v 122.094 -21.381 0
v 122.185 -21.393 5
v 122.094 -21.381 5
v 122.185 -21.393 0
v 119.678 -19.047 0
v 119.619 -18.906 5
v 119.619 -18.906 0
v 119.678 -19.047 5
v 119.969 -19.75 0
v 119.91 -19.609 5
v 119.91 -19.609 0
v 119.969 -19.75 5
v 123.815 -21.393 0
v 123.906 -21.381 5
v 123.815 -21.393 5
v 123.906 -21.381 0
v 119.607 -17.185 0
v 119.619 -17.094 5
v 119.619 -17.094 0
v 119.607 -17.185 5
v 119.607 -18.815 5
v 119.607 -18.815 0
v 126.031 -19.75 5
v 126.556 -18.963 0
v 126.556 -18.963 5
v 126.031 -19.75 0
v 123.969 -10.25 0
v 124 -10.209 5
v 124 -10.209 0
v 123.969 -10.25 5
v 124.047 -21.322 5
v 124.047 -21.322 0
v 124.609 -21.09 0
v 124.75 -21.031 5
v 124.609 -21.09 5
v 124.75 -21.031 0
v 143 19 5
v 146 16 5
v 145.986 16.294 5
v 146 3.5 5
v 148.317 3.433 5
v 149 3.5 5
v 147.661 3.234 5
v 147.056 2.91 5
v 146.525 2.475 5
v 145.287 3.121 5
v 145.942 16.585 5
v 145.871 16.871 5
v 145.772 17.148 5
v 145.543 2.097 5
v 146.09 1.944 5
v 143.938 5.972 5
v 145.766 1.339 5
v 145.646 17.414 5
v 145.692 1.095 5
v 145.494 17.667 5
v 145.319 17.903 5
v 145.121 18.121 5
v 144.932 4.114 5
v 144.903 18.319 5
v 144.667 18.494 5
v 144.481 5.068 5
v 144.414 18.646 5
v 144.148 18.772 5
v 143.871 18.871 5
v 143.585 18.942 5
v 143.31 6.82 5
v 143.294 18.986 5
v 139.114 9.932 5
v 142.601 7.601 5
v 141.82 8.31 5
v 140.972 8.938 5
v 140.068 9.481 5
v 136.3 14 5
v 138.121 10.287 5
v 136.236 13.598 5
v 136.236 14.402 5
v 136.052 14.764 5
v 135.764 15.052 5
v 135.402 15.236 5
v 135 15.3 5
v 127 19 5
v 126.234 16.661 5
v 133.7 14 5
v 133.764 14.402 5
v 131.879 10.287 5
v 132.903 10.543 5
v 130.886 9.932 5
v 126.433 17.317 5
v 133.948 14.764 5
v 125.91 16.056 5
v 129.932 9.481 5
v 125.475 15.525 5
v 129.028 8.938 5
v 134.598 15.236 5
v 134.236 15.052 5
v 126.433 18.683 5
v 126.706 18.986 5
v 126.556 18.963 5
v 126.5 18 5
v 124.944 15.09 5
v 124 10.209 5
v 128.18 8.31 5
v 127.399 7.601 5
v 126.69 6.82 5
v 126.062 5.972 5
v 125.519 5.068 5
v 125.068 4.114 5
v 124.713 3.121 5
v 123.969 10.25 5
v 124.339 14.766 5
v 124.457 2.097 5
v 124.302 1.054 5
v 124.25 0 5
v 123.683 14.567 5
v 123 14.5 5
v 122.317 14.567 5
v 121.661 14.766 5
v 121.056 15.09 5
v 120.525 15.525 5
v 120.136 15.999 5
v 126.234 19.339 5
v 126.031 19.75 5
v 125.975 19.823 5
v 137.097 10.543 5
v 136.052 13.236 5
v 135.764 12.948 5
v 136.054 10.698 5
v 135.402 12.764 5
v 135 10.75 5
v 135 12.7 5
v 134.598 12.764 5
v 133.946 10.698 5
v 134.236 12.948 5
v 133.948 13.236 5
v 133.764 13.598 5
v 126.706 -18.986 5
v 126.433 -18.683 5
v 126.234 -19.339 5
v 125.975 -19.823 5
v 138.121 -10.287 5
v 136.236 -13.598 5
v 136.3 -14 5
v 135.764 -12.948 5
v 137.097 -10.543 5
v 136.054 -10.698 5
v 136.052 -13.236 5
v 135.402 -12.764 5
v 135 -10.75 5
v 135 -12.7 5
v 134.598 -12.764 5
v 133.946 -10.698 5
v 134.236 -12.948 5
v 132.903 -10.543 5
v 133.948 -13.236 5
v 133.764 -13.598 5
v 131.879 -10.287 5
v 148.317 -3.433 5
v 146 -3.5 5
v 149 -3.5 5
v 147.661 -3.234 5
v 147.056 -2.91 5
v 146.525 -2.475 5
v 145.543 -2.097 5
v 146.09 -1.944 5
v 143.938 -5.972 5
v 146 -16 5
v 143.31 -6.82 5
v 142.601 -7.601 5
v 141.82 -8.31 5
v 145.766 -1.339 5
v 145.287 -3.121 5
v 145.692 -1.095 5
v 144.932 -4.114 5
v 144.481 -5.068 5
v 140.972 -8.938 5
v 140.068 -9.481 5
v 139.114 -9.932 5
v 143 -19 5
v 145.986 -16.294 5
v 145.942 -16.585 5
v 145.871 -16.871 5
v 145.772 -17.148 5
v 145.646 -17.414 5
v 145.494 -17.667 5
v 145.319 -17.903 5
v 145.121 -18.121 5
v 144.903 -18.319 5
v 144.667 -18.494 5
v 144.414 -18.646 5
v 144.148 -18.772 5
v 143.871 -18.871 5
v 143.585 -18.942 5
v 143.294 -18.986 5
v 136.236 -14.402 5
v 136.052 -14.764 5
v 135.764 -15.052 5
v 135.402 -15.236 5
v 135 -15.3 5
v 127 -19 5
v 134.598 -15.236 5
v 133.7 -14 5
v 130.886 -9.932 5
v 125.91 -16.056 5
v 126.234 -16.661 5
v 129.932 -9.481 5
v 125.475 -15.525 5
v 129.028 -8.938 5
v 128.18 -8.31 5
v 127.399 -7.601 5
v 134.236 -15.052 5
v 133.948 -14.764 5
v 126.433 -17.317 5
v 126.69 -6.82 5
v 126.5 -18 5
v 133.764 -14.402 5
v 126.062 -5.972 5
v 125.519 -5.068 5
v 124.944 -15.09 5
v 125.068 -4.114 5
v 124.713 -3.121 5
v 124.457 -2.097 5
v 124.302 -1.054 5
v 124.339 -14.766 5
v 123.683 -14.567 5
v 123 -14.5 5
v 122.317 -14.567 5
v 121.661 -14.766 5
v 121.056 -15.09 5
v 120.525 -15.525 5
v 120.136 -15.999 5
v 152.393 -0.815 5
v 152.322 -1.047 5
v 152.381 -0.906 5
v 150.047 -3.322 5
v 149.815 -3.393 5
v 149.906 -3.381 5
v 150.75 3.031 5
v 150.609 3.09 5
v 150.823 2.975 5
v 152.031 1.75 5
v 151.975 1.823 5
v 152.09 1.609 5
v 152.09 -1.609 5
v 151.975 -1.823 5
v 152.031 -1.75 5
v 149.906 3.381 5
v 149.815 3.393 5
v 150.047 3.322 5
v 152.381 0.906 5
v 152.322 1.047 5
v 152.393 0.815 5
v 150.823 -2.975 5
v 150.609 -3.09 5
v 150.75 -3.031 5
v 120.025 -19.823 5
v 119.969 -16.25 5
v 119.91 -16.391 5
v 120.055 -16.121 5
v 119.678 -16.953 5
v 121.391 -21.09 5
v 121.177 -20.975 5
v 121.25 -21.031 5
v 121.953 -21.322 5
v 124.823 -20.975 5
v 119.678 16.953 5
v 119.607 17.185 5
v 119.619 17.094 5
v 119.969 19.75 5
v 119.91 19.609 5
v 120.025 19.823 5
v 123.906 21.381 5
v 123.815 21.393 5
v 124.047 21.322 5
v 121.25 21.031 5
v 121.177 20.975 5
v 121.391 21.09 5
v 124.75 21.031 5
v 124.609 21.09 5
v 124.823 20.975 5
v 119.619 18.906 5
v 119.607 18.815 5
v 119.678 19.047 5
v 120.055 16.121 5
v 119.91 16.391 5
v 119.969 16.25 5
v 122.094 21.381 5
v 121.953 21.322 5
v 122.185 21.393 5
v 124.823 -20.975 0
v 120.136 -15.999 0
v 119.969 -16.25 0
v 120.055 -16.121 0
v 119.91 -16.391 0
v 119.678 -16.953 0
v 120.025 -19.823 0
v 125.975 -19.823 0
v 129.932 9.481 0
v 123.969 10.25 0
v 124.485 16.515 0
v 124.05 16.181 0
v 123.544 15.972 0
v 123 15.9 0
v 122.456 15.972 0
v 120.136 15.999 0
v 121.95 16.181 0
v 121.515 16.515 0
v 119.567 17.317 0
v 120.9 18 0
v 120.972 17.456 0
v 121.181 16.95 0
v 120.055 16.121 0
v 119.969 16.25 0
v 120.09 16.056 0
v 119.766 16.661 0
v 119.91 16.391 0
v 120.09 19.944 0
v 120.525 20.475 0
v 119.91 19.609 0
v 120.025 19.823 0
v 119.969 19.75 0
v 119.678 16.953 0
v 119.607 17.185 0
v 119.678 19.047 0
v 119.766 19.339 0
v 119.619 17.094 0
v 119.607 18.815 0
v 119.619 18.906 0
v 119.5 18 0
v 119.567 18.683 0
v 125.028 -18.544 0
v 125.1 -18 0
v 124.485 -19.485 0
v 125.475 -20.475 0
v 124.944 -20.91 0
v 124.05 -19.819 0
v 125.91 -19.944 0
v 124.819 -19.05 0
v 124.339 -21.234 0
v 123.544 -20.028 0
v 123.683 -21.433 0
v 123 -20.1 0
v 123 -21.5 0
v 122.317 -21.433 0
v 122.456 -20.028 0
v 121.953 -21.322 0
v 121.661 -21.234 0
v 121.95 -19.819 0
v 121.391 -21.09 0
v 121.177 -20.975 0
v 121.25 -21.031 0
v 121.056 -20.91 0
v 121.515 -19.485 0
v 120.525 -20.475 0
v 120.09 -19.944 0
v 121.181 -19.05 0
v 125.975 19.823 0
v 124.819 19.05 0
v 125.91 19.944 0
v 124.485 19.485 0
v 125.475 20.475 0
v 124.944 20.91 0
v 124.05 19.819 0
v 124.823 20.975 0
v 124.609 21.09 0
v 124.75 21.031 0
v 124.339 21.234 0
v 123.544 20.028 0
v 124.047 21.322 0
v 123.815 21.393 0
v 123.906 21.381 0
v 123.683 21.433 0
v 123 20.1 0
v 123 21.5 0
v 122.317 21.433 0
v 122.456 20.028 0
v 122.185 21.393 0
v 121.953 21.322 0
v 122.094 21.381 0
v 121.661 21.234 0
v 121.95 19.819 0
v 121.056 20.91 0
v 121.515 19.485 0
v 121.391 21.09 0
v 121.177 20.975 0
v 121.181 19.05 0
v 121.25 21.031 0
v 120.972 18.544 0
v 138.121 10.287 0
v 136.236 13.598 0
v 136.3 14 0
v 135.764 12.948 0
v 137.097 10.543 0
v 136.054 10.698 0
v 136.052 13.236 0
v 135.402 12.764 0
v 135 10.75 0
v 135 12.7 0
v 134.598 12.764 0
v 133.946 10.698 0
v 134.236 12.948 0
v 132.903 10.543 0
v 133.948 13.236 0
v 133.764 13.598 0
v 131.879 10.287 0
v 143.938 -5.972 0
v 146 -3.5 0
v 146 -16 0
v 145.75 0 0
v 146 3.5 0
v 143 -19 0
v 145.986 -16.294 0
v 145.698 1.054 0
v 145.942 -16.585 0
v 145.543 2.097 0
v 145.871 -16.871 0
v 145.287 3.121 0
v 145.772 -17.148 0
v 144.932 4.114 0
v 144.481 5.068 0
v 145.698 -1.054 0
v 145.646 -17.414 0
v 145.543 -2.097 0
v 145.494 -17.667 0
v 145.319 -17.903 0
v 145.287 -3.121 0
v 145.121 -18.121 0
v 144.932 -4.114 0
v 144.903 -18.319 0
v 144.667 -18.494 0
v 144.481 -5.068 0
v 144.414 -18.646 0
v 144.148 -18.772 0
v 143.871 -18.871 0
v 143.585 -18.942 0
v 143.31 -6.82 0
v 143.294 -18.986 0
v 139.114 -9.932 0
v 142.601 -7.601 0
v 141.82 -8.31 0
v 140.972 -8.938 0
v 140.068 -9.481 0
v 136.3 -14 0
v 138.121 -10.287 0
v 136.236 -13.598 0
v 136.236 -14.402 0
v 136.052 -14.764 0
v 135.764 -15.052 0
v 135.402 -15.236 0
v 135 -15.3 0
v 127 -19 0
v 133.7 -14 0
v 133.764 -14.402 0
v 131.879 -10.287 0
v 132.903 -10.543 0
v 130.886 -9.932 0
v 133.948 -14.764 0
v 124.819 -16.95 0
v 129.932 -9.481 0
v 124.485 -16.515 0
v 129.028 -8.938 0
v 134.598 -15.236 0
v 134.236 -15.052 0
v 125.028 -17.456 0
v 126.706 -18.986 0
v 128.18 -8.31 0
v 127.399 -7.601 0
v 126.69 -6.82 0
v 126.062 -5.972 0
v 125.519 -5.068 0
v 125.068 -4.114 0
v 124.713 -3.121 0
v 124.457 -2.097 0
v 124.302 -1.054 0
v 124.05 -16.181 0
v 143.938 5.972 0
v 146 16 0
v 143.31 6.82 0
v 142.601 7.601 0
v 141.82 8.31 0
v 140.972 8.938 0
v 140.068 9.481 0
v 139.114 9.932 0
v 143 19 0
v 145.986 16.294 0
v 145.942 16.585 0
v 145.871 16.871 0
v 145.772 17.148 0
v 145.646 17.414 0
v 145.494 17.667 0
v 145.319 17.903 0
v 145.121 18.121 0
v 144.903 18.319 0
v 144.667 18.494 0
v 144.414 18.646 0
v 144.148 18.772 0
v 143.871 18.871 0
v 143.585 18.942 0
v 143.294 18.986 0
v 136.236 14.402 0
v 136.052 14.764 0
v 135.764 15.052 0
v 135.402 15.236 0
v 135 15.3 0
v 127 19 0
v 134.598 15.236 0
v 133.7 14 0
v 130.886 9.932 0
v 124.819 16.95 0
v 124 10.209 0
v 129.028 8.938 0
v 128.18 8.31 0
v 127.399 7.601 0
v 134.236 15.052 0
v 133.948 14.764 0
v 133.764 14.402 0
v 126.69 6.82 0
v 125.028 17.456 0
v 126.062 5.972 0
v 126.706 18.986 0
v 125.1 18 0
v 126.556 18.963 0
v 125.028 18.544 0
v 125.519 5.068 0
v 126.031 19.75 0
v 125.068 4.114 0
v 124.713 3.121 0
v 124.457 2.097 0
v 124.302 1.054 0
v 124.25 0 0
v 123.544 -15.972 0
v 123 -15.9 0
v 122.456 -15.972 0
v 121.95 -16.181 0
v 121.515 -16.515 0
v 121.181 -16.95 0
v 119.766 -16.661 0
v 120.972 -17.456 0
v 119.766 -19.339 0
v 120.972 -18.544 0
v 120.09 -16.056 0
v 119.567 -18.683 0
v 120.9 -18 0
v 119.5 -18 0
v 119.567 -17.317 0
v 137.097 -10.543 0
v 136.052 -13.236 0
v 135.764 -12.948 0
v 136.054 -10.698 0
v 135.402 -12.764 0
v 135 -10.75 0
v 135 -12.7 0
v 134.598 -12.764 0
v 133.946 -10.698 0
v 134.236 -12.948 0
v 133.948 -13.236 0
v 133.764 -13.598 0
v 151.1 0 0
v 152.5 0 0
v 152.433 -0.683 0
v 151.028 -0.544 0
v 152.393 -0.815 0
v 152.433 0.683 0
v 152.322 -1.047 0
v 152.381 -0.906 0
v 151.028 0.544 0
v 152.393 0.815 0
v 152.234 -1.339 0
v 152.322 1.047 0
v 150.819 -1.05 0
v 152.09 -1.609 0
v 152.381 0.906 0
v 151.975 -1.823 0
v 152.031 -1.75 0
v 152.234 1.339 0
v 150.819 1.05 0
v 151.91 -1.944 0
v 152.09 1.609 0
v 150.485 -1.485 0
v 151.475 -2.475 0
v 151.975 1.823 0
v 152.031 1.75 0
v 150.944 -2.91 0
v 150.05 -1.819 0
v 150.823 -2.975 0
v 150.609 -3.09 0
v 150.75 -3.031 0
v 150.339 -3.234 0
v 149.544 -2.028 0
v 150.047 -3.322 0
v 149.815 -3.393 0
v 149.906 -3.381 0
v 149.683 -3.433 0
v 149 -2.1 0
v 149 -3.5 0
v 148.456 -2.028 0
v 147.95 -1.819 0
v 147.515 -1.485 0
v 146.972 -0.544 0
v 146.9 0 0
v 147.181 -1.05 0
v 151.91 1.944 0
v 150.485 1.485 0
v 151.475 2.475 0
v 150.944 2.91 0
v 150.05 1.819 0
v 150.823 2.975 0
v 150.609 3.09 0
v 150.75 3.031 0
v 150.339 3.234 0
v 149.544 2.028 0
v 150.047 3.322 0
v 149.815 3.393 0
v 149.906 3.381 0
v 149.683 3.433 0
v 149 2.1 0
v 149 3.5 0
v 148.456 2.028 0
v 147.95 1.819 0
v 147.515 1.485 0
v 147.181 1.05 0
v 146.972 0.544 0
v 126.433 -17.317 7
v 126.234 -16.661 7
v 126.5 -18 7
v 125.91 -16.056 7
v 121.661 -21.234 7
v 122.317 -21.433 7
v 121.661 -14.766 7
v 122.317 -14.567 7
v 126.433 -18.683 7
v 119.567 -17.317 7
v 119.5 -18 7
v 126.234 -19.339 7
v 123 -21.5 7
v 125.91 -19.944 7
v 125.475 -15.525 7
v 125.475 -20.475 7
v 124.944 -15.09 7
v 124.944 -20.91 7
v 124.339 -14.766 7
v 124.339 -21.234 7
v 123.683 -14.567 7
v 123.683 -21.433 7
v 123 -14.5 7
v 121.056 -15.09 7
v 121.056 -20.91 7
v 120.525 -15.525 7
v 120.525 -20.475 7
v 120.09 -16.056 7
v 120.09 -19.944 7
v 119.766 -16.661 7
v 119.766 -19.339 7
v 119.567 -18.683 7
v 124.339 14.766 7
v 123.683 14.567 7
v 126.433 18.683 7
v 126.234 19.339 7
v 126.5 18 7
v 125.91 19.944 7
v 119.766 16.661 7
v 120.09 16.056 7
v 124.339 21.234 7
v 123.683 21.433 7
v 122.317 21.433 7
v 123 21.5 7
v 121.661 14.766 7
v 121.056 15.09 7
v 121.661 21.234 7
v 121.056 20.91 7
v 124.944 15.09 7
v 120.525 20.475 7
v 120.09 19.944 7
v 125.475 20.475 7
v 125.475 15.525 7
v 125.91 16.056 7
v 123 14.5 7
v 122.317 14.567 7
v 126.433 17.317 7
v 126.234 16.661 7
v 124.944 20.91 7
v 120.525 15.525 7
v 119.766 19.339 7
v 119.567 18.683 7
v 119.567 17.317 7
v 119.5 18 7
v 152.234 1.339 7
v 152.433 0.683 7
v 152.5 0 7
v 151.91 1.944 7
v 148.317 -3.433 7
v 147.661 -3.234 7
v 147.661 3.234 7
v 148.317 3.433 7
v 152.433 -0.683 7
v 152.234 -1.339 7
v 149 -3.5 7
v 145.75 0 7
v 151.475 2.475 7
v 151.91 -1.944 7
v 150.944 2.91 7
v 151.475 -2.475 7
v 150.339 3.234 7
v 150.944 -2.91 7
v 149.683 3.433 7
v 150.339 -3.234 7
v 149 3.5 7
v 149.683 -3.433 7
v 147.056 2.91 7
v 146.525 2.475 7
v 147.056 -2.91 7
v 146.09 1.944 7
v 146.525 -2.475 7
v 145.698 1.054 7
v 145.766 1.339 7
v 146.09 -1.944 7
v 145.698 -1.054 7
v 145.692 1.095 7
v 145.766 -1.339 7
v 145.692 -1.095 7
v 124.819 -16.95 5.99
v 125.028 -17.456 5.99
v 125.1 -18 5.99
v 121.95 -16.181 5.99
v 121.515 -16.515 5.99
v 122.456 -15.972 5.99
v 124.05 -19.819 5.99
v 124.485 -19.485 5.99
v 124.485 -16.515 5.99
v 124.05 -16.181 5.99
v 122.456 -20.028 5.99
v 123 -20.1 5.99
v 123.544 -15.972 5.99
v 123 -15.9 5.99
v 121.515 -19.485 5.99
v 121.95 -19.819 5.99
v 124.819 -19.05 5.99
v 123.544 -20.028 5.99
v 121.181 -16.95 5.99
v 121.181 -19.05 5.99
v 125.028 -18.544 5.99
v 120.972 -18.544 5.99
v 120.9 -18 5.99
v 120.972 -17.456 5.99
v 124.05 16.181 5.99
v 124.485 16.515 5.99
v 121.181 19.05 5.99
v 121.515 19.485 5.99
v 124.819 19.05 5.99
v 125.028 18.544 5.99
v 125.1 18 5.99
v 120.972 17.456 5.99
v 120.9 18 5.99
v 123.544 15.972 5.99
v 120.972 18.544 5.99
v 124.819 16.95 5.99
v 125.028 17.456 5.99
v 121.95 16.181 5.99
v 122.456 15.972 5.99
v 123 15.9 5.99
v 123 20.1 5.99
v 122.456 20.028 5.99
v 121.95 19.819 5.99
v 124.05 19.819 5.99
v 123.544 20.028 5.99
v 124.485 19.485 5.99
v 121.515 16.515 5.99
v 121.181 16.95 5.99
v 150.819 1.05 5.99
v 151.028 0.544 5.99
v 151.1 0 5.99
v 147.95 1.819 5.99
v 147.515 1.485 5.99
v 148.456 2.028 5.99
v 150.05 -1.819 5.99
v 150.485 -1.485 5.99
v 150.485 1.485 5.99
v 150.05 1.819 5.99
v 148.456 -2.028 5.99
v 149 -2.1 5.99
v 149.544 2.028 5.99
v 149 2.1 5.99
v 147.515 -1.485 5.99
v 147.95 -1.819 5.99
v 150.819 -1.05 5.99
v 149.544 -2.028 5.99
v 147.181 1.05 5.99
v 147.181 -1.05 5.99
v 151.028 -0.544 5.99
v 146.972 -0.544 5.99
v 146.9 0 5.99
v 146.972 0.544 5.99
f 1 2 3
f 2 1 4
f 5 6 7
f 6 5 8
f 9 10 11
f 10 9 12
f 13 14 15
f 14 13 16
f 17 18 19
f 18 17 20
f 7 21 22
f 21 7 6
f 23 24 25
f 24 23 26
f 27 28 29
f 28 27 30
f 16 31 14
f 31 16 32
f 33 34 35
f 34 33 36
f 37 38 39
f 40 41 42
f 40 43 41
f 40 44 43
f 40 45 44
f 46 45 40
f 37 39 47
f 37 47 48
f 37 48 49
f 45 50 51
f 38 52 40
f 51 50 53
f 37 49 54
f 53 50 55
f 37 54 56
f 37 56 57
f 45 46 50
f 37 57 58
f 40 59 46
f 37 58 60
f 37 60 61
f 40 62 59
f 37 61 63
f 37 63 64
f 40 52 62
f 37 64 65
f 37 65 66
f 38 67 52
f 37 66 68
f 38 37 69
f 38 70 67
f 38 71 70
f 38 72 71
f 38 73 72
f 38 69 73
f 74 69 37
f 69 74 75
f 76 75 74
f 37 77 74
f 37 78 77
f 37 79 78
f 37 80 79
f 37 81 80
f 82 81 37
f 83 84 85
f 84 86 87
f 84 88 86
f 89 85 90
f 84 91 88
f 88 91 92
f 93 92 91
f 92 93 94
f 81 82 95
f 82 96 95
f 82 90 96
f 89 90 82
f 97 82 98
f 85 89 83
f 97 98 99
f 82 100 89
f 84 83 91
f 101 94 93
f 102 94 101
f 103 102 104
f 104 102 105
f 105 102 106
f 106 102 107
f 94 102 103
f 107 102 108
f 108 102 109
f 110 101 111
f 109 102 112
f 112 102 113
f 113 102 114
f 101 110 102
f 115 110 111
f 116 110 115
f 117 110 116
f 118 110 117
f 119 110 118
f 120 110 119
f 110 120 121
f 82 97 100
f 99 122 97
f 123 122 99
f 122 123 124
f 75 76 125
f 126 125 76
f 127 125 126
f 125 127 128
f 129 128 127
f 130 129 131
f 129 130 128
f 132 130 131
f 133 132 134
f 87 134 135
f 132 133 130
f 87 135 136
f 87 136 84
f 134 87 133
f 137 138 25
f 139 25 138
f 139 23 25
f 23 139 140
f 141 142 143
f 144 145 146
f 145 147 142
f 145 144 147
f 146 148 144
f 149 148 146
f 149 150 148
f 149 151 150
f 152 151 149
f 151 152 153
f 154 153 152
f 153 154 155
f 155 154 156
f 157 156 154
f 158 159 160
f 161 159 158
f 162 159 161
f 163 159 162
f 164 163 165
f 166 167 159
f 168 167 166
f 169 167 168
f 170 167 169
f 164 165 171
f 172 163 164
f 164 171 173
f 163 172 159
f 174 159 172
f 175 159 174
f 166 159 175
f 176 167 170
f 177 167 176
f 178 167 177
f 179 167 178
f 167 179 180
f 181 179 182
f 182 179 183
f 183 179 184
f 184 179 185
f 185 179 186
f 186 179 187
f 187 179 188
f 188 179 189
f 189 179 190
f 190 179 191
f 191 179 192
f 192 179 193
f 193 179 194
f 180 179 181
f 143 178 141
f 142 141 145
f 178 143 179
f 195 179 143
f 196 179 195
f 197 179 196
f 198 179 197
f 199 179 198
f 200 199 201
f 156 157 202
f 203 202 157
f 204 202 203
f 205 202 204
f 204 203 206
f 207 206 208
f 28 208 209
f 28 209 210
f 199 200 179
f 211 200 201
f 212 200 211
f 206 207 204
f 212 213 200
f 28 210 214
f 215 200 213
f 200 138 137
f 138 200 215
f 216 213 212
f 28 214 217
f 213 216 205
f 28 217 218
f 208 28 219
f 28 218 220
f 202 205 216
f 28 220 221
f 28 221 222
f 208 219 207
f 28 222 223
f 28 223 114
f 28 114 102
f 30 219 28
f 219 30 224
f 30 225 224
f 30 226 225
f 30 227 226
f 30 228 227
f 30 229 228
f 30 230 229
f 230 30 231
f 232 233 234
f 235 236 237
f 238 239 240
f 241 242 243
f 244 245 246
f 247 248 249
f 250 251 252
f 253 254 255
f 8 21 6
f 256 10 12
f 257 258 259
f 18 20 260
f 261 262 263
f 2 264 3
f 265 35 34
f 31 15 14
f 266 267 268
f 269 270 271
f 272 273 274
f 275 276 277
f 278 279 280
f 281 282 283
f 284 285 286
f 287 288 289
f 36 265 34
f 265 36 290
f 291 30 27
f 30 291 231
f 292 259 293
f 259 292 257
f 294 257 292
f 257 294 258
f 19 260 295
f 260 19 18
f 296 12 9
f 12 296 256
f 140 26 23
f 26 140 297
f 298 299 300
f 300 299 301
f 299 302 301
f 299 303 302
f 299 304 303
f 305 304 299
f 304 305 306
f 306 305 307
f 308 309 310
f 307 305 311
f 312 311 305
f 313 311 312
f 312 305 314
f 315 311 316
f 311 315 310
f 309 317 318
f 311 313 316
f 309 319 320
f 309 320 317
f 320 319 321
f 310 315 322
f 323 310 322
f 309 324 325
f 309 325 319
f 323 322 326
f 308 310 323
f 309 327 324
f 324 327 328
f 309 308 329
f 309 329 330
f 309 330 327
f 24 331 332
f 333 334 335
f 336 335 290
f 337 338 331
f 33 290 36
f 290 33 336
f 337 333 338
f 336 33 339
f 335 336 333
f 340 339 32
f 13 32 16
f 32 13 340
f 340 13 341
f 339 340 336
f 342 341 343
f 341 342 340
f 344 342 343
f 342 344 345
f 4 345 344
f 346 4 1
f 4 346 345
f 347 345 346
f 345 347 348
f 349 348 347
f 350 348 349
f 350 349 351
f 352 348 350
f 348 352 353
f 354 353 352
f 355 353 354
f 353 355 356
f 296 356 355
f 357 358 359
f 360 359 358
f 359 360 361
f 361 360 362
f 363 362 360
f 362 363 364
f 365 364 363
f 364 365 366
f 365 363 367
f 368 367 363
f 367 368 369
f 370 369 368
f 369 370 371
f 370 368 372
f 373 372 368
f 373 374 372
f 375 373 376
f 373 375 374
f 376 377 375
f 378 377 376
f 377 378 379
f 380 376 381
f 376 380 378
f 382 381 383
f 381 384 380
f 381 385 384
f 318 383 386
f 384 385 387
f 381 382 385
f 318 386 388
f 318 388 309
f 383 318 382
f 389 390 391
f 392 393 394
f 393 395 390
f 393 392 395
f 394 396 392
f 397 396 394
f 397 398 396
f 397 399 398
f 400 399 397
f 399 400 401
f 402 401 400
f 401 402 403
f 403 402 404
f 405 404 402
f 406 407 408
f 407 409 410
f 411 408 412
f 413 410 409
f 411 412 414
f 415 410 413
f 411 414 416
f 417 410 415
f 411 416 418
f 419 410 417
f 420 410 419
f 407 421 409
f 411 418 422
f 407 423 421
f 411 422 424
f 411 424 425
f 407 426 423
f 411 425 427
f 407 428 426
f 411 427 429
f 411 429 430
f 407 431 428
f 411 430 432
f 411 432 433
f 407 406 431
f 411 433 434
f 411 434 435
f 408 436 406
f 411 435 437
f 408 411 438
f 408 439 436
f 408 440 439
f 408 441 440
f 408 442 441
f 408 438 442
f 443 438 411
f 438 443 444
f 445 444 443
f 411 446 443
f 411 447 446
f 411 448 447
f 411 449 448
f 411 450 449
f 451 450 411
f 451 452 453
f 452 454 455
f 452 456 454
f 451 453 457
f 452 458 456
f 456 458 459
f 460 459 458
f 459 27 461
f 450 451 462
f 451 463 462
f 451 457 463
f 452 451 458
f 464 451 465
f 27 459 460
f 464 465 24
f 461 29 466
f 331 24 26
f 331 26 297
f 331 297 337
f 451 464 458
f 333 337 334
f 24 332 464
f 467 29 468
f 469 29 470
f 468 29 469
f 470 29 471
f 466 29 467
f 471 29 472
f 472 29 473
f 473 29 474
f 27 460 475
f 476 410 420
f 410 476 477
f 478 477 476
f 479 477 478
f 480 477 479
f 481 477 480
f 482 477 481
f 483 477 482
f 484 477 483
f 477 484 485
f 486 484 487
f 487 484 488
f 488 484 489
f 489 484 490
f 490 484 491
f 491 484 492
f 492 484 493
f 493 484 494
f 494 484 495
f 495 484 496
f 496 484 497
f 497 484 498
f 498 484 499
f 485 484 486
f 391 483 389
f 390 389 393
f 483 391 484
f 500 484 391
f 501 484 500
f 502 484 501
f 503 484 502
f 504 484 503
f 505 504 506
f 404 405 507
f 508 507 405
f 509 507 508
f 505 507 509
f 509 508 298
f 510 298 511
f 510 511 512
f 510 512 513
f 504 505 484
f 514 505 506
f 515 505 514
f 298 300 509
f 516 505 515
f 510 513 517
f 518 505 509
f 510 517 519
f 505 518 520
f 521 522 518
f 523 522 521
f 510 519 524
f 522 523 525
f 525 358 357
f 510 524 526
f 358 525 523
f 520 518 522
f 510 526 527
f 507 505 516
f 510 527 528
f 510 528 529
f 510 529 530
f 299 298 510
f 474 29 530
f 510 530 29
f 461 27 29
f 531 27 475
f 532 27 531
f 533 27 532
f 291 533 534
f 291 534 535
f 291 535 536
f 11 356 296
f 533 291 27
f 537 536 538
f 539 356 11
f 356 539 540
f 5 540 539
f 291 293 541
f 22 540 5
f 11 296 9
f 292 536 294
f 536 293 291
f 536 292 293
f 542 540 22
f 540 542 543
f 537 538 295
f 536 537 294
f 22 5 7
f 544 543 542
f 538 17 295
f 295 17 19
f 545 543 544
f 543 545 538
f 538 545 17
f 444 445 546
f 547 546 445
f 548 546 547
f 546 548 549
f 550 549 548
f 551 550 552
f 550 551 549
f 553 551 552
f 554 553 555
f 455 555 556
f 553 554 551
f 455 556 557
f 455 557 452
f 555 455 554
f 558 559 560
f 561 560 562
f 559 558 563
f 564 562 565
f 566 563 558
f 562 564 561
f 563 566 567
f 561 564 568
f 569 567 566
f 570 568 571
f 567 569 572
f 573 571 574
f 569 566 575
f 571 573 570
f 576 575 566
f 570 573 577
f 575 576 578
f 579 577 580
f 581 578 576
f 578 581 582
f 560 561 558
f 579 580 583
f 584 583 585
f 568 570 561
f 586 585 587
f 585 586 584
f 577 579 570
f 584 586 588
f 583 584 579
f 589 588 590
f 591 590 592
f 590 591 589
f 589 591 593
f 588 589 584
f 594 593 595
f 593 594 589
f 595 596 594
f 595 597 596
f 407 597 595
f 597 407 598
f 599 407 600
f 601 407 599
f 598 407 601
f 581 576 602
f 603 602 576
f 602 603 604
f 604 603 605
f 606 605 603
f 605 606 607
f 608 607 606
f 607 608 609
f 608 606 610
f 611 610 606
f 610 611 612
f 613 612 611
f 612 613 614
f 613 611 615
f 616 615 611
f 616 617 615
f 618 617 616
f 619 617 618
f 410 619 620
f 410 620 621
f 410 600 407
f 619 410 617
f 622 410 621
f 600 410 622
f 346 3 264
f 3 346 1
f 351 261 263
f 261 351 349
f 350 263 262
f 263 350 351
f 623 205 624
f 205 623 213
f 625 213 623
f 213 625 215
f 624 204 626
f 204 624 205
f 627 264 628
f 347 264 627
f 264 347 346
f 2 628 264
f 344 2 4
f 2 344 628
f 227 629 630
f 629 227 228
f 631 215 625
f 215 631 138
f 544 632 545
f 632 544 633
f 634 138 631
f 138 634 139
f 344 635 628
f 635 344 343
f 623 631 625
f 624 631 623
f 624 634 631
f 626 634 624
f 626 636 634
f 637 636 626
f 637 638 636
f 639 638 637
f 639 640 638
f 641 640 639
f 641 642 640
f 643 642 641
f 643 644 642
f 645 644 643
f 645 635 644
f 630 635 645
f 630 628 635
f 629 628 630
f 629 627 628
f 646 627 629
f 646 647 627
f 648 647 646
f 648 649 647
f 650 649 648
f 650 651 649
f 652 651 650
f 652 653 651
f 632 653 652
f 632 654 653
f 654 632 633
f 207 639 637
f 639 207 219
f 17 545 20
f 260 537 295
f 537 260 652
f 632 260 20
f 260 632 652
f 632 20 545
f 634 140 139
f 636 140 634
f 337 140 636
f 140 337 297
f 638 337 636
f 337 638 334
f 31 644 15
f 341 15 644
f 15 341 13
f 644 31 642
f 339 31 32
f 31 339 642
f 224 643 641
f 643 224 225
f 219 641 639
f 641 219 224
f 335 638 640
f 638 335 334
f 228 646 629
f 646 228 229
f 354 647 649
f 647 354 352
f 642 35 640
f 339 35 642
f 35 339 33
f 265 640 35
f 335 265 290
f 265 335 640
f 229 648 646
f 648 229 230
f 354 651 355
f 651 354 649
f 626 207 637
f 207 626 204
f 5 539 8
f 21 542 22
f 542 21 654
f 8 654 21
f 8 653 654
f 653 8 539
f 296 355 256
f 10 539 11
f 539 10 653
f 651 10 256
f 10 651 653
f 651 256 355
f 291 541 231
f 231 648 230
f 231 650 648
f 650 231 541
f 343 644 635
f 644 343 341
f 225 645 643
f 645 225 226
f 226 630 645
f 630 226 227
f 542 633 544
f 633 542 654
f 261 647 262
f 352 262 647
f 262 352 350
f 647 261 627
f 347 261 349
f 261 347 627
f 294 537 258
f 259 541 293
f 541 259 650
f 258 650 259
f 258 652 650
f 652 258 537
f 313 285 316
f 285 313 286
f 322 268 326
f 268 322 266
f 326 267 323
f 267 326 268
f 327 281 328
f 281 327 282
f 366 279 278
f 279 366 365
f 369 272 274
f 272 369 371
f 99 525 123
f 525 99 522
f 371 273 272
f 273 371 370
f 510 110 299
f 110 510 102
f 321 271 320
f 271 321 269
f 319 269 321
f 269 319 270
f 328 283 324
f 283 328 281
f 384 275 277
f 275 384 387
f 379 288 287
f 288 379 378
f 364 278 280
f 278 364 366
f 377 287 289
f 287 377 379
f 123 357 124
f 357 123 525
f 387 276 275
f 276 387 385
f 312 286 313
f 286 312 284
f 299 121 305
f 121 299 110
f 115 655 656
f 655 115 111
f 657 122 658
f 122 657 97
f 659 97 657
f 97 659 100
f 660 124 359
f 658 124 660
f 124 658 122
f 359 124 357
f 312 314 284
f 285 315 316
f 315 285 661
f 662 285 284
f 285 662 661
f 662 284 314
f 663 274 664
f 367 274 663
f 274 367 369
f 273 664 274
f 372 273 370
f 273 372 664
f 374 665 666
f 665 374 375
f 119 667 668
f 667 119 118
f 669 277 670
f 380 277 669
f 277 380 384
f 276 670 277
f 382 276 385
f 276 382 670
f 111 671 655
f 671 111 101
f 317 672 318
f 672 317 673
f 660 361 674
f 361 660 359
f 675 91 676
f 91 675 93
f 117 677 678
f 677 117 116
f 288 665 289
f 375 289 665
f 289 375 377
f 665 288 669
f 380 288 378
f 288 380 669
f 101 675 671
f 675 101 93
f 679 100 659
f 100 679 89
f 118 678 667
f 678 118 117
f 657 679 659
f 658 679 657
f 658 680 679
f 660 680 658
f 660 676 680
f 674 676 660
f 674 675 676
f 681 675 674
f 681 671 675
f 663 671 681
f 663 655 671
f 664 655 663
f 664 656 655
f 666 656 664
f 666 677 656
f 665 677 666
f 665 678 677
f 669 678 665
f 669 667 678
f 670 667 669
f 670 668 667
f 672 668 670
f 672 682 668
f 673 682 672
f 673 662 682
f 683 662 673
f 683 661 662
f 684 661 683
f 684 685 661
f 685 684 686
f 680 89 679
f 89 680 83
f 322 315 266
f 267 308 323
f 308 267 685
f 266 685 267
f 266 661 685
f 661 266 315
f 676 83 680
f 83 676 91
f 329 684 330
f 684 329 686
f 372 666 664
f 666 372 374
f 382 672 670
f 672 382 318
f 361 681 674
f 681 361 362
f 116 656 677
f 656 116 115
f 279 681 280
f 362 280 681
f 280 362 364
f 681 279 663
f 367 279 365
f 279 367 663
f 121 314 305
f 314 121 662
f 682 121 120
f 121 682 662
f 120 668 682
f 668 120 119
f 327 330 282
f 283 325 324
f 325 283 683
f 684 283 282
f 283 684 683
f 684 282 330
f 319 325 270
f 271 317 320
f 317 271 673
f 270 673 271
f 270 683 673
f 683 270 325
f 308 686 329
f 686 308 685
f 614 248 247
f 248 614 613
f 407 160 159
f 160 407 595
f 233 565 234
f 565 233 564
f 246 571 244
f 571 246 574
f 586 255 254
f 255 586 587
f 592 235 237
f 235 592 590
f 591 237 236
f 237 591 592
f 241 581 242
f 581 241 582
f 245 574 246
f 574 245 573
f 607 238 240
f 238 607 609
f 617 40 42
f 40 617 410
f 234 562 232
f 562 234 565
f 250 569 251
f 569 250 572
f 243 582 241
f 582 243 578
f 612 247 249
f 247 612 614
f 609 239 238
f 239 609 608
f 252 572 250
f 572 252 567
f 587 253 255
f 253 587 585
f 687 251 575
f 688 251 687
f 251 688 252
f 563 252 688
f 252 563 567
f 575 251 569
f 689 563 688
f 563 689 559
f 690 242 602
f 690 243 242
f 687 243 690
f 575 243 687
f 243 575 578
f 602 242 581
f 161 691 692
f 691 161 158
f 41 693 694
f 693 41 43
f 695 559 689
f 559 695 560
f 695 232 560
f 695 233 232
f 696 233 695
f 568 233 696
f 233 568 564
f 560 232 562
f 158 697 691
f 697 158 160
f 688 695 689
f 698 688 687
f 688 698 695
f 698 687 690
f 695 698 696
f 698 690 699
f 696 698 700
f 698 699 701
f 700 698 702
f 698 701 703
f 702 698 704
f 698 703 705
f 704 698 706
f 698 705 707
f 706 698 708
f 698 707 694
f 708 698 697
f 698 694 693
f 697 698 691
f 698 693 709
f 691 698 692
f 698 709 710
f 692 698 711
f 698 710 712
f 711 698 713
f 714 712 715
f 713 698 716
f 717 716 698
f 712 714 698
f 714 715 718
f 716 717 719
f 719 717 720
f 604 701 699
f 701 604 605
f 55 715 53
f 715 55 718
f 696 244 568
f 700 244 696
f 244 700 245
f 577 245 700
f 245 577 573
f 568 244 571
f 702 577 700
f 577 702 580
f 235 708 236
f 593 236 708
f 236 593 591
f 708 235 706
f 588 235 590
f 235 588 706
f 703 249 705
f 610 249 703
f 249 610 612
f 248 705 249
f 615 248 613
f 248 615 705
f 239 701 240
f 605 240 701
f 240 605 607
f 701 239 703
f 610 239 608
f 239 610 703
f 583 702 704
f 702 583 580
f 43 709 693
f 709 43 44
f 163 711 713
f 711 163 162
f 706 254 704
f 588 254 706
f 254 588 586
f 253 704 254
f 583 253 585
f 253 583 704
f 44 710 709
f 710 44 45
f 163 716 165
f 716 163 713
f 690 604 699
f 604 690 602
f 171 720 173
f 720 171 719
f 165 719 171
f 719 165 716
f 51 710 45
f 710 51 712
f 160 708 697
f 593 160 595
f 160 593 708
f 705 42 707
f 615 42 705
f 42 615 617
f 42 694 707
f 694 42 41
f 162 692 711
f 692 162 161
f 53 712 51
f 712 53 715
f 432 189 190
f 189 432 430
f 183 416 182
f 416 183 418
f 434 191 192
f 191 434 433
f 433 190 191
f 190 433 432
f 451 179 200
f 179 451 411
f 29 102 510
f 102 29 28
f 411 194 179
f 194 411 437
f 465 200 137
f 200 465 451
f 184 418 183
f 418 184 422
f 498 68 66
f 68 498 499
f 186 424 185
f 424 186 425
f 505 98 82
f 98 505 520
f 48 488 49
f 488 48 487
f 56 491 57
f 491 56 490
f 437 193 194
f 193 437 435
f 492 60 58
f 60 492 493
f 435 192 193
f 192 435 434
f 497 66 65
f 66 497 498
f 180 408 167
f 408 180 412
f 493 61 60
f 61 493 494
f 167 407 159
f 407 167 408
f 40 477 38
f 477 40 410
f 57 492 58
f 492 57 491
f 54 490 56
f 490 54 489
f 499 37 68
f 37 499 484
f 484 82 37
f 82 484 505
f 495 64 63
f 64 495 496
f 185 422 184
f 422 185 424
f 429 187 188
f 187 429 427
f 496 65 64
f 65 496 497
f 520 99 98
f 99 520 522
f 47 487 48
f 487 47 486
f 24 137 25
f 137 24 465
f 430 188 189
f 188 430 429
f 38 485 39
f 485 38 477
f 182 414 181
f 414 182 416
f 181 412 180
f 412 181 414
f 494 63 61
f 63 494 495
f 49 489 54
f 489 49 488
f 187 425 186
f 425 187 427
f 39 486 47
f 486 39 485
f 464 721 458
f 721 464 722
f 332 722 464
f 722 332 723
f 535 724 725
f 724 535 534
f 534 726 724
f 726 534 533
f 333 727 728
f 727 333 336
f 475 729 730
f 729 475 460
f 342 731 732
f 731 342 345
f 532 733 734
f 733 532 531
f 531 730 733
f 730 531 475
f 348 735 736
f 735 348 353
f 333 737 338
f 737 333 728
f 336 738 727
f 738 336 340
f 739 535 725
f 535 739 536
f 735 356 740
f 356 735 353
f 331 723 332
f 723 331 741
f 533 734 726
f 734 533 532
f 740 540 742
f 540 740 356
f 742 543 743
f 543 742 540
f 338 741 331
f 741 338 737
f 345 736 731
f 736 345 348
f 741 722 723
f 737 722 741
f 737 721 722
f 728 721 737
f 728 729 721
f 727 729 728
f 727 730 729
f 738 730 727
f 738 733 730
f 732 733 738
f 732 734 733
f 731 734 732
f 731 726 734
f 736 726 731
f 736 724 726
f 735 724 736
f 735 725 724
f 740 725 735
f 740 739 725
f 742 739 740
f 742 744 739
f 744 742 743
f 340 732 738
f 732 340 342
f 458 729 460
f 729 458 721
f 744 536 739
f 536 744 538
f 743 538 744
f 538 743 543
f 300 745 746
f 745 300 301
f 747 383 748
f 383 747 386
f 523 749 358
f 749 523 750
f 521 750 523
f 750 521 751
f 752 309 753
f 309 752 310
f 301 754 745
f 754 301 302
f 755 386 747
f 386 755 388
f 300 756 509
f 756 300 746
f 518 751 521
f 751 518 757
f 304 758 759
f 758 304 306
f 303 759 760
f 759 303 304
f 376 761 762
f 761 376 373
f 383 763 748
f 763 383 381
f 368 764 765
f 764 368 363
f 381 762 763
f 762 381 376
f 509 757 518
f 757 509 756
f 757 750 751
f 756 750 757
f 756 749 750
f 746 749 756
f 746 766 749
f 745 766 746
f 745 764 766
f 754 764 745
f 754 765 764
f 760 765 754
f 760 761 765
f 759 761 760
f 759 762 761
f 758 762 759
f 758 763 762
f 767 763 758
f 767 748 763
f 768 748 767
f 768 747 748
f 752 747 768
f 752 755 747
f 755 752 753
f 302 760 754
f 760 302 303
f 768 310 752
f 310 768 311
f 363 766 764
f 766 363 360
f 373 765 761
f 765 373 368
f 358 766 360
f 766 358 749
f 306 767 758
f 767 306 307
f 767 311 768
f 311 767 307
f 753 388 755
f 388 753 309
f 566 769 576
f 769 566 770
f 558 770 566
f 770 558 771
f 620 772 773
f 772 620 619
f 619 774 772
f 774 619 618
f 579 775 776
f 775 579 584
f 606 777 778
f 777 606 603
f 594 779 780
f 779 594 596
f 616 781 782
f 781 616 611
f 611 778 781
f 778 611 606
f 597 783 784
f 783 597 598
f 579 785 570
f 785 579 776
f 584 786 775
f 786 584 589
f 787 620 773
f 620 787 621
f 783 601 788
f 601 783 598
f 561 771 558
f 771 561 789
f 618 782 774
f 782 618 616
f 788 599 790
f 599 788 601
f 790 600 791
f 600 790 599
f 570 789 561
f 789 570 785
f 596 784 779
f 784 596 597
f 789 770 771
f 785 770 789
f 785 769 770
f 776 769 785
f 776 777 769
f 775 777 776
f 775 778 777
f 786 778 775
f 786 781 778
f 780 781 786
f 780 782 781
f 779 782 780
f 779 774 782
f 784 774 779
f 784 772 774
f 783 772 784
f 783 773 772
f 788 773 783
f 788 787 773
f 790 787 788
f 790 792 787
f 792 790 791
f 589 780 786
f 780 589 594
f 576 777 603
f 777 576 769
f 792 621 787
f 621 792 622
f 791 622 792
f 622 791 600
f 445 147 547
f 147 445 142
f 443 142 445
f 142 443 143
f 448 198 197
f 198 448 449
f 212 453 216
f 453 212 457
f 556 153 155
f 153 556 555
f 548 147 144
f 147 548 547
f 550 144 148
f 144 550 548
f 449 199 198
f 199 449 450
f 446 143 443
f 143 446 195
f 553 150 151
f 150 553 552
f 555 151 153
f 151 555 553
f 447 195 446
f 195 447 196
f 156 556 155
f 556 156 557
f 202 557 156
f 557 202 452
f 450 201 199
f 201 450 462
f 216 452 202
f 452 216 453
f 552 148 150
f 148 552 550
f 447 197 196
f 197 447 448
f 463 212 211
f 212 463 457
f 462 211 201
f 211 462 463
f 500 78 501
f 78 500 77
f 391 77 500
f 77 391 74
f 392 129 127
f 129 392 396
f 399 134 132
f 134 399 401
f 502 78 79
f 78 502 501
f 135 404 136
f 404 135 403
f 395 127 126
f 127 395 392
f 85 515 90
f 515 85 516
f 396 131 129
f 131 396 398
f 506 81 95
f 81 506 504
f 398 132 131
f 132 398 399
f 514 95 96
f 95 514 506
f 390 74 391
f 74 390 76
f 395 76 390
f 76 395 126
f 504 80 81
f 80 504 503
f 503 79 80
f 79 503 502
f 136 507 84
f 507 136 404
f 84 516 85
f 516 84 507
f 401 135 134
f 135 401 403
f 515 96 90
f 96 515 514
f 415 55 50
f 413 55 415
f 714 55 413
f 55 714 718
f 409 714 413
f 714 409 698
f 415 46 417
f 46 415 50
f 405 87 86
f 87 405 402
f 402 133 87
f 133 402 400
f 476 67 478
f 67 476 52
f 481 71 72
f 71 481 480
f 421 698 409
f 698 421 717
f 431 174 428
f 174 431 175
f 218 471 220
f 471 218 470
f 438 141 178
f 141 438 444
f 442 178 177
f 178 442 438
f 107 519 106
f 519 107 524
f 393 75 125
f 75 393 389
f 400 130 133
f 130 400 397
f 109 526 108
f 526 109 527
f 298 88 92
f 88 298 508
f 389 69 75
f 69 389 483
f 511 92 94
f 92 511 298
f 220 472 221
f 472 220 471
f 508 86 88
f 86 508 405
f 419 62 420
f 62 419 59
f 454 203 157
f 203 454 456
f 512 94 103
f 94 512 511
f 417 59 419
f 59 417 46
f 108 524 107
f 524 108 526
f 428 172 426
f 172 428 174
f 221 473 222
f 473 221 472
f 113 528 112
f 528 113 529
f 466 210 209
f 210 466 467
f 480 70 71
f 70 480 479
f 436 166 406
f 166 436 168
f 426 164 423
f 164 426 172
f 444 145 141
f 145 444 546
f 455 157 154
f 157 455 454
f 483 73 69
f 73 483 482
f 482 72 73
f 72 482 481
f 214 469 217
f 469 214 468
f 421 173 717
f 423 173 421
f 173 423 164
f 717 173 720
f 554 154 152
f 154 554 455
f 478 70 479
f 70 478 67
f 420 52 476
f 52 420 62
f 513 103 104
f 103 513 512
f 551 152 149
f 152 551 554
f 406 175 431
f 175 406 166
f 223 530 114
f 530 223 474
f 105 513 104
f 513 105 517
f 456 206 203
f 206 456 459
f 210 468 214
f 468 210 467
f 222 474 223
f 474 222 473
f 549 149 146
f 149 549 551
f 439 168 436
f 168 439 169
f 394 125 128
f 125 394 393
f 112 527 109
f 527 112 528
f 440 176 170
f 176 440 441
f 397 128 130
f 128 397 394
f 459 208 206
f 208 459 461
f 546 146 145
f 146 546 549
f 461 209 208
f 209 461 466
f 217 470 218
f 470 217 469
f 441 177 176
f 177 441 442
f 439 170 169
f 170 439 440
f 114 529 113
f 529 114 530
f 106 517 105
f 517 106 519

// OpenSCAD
// =====================================================================
//  robot base :: front caster mount (print 1)
//  5 mm block on the floor at rb_caster_xy: top face z 23 = caster mounting face
//  (rb_caster_h). d 21.5 hole lets the caster housing (d 20) and ball pass down
//  through the block and the floor's d 24 hole. 2x M3 tapped holes (d 2.6, 5 deep)
//  at rb_caster_holes along Y: use M3x6-8 (plate + 5). The 3 floor fixings
//  (rb_fix_caster) sit in 7 mm towers (a 5 mm block cannot hold a 6 mm insert);
//  towers stay outside the caster plate footprint (plate placeholder x +-8, y +-16).
//  Hardware: 3x M3 inserts, 3x M3x10 from below, 2x M3 caster screws.
//  Print orientation: assembled (floor face down).
//  robot_caster_mount()  robot frame.
// =====================================================================
include <../lib/params.scad>
include <../lib/robot_params.scad>

rbcm_t = rb_caster_h - rb_floor_top;   // 5
rbcm_tw = 7;                           // tower height

module robot_caster_mount() {
    cx = rb_caster_xy[0]; cy = rb_caster_xy[1]; z0 = rb_floor_top;
    difference() {
        union() {
            translate([cx, cy, z0]) linear_extrude(rbcm_t) {
                offset(r = 3) square([22 - 6, 38 - 6], center = true);
            }
            for (p = rb_fix_caster) {
                translate([0, 0, z0]) linear_extrude(rbcm_t)
                    hull() { translate(p) circle(r = 3.5, $fn = 24);
                             translate([clamp(p[0], cx - 8, cx + 8), clamp(p[1], -12, 12)]) circle(r = 3.5, $fn = 24); }
                translate([p[0], p[1], z0]) cylinder(h = rbcm_tw, r = 3.5, $fn = 32);
            }
        }
        translate([cx, cy, z0 - 1]) cylinder(h = 20, d = 21.5, $fn = 64);
        for (p = rb_fix_caster) translate([p[0], p[1], z0 - 0.01]) cylinder(h = m3_insert_h + 1, d = m3_insert_d, $fn = 24);
        for (s = [-1, 1]) translate([cx, cy + s * rb_caster_holes[0] / 2, z0 - 1]) cylinder(h = rbcm_t + 2, d = m3_tap, $fn = 20);
    }
}
function clamp(v, a, b) = min(max(v, a), b);

module robot_caster_mount_print() { translate([0, 0, -rb_floor_top]) robot_caster_mount(); }

robot_caster_mount_print();
